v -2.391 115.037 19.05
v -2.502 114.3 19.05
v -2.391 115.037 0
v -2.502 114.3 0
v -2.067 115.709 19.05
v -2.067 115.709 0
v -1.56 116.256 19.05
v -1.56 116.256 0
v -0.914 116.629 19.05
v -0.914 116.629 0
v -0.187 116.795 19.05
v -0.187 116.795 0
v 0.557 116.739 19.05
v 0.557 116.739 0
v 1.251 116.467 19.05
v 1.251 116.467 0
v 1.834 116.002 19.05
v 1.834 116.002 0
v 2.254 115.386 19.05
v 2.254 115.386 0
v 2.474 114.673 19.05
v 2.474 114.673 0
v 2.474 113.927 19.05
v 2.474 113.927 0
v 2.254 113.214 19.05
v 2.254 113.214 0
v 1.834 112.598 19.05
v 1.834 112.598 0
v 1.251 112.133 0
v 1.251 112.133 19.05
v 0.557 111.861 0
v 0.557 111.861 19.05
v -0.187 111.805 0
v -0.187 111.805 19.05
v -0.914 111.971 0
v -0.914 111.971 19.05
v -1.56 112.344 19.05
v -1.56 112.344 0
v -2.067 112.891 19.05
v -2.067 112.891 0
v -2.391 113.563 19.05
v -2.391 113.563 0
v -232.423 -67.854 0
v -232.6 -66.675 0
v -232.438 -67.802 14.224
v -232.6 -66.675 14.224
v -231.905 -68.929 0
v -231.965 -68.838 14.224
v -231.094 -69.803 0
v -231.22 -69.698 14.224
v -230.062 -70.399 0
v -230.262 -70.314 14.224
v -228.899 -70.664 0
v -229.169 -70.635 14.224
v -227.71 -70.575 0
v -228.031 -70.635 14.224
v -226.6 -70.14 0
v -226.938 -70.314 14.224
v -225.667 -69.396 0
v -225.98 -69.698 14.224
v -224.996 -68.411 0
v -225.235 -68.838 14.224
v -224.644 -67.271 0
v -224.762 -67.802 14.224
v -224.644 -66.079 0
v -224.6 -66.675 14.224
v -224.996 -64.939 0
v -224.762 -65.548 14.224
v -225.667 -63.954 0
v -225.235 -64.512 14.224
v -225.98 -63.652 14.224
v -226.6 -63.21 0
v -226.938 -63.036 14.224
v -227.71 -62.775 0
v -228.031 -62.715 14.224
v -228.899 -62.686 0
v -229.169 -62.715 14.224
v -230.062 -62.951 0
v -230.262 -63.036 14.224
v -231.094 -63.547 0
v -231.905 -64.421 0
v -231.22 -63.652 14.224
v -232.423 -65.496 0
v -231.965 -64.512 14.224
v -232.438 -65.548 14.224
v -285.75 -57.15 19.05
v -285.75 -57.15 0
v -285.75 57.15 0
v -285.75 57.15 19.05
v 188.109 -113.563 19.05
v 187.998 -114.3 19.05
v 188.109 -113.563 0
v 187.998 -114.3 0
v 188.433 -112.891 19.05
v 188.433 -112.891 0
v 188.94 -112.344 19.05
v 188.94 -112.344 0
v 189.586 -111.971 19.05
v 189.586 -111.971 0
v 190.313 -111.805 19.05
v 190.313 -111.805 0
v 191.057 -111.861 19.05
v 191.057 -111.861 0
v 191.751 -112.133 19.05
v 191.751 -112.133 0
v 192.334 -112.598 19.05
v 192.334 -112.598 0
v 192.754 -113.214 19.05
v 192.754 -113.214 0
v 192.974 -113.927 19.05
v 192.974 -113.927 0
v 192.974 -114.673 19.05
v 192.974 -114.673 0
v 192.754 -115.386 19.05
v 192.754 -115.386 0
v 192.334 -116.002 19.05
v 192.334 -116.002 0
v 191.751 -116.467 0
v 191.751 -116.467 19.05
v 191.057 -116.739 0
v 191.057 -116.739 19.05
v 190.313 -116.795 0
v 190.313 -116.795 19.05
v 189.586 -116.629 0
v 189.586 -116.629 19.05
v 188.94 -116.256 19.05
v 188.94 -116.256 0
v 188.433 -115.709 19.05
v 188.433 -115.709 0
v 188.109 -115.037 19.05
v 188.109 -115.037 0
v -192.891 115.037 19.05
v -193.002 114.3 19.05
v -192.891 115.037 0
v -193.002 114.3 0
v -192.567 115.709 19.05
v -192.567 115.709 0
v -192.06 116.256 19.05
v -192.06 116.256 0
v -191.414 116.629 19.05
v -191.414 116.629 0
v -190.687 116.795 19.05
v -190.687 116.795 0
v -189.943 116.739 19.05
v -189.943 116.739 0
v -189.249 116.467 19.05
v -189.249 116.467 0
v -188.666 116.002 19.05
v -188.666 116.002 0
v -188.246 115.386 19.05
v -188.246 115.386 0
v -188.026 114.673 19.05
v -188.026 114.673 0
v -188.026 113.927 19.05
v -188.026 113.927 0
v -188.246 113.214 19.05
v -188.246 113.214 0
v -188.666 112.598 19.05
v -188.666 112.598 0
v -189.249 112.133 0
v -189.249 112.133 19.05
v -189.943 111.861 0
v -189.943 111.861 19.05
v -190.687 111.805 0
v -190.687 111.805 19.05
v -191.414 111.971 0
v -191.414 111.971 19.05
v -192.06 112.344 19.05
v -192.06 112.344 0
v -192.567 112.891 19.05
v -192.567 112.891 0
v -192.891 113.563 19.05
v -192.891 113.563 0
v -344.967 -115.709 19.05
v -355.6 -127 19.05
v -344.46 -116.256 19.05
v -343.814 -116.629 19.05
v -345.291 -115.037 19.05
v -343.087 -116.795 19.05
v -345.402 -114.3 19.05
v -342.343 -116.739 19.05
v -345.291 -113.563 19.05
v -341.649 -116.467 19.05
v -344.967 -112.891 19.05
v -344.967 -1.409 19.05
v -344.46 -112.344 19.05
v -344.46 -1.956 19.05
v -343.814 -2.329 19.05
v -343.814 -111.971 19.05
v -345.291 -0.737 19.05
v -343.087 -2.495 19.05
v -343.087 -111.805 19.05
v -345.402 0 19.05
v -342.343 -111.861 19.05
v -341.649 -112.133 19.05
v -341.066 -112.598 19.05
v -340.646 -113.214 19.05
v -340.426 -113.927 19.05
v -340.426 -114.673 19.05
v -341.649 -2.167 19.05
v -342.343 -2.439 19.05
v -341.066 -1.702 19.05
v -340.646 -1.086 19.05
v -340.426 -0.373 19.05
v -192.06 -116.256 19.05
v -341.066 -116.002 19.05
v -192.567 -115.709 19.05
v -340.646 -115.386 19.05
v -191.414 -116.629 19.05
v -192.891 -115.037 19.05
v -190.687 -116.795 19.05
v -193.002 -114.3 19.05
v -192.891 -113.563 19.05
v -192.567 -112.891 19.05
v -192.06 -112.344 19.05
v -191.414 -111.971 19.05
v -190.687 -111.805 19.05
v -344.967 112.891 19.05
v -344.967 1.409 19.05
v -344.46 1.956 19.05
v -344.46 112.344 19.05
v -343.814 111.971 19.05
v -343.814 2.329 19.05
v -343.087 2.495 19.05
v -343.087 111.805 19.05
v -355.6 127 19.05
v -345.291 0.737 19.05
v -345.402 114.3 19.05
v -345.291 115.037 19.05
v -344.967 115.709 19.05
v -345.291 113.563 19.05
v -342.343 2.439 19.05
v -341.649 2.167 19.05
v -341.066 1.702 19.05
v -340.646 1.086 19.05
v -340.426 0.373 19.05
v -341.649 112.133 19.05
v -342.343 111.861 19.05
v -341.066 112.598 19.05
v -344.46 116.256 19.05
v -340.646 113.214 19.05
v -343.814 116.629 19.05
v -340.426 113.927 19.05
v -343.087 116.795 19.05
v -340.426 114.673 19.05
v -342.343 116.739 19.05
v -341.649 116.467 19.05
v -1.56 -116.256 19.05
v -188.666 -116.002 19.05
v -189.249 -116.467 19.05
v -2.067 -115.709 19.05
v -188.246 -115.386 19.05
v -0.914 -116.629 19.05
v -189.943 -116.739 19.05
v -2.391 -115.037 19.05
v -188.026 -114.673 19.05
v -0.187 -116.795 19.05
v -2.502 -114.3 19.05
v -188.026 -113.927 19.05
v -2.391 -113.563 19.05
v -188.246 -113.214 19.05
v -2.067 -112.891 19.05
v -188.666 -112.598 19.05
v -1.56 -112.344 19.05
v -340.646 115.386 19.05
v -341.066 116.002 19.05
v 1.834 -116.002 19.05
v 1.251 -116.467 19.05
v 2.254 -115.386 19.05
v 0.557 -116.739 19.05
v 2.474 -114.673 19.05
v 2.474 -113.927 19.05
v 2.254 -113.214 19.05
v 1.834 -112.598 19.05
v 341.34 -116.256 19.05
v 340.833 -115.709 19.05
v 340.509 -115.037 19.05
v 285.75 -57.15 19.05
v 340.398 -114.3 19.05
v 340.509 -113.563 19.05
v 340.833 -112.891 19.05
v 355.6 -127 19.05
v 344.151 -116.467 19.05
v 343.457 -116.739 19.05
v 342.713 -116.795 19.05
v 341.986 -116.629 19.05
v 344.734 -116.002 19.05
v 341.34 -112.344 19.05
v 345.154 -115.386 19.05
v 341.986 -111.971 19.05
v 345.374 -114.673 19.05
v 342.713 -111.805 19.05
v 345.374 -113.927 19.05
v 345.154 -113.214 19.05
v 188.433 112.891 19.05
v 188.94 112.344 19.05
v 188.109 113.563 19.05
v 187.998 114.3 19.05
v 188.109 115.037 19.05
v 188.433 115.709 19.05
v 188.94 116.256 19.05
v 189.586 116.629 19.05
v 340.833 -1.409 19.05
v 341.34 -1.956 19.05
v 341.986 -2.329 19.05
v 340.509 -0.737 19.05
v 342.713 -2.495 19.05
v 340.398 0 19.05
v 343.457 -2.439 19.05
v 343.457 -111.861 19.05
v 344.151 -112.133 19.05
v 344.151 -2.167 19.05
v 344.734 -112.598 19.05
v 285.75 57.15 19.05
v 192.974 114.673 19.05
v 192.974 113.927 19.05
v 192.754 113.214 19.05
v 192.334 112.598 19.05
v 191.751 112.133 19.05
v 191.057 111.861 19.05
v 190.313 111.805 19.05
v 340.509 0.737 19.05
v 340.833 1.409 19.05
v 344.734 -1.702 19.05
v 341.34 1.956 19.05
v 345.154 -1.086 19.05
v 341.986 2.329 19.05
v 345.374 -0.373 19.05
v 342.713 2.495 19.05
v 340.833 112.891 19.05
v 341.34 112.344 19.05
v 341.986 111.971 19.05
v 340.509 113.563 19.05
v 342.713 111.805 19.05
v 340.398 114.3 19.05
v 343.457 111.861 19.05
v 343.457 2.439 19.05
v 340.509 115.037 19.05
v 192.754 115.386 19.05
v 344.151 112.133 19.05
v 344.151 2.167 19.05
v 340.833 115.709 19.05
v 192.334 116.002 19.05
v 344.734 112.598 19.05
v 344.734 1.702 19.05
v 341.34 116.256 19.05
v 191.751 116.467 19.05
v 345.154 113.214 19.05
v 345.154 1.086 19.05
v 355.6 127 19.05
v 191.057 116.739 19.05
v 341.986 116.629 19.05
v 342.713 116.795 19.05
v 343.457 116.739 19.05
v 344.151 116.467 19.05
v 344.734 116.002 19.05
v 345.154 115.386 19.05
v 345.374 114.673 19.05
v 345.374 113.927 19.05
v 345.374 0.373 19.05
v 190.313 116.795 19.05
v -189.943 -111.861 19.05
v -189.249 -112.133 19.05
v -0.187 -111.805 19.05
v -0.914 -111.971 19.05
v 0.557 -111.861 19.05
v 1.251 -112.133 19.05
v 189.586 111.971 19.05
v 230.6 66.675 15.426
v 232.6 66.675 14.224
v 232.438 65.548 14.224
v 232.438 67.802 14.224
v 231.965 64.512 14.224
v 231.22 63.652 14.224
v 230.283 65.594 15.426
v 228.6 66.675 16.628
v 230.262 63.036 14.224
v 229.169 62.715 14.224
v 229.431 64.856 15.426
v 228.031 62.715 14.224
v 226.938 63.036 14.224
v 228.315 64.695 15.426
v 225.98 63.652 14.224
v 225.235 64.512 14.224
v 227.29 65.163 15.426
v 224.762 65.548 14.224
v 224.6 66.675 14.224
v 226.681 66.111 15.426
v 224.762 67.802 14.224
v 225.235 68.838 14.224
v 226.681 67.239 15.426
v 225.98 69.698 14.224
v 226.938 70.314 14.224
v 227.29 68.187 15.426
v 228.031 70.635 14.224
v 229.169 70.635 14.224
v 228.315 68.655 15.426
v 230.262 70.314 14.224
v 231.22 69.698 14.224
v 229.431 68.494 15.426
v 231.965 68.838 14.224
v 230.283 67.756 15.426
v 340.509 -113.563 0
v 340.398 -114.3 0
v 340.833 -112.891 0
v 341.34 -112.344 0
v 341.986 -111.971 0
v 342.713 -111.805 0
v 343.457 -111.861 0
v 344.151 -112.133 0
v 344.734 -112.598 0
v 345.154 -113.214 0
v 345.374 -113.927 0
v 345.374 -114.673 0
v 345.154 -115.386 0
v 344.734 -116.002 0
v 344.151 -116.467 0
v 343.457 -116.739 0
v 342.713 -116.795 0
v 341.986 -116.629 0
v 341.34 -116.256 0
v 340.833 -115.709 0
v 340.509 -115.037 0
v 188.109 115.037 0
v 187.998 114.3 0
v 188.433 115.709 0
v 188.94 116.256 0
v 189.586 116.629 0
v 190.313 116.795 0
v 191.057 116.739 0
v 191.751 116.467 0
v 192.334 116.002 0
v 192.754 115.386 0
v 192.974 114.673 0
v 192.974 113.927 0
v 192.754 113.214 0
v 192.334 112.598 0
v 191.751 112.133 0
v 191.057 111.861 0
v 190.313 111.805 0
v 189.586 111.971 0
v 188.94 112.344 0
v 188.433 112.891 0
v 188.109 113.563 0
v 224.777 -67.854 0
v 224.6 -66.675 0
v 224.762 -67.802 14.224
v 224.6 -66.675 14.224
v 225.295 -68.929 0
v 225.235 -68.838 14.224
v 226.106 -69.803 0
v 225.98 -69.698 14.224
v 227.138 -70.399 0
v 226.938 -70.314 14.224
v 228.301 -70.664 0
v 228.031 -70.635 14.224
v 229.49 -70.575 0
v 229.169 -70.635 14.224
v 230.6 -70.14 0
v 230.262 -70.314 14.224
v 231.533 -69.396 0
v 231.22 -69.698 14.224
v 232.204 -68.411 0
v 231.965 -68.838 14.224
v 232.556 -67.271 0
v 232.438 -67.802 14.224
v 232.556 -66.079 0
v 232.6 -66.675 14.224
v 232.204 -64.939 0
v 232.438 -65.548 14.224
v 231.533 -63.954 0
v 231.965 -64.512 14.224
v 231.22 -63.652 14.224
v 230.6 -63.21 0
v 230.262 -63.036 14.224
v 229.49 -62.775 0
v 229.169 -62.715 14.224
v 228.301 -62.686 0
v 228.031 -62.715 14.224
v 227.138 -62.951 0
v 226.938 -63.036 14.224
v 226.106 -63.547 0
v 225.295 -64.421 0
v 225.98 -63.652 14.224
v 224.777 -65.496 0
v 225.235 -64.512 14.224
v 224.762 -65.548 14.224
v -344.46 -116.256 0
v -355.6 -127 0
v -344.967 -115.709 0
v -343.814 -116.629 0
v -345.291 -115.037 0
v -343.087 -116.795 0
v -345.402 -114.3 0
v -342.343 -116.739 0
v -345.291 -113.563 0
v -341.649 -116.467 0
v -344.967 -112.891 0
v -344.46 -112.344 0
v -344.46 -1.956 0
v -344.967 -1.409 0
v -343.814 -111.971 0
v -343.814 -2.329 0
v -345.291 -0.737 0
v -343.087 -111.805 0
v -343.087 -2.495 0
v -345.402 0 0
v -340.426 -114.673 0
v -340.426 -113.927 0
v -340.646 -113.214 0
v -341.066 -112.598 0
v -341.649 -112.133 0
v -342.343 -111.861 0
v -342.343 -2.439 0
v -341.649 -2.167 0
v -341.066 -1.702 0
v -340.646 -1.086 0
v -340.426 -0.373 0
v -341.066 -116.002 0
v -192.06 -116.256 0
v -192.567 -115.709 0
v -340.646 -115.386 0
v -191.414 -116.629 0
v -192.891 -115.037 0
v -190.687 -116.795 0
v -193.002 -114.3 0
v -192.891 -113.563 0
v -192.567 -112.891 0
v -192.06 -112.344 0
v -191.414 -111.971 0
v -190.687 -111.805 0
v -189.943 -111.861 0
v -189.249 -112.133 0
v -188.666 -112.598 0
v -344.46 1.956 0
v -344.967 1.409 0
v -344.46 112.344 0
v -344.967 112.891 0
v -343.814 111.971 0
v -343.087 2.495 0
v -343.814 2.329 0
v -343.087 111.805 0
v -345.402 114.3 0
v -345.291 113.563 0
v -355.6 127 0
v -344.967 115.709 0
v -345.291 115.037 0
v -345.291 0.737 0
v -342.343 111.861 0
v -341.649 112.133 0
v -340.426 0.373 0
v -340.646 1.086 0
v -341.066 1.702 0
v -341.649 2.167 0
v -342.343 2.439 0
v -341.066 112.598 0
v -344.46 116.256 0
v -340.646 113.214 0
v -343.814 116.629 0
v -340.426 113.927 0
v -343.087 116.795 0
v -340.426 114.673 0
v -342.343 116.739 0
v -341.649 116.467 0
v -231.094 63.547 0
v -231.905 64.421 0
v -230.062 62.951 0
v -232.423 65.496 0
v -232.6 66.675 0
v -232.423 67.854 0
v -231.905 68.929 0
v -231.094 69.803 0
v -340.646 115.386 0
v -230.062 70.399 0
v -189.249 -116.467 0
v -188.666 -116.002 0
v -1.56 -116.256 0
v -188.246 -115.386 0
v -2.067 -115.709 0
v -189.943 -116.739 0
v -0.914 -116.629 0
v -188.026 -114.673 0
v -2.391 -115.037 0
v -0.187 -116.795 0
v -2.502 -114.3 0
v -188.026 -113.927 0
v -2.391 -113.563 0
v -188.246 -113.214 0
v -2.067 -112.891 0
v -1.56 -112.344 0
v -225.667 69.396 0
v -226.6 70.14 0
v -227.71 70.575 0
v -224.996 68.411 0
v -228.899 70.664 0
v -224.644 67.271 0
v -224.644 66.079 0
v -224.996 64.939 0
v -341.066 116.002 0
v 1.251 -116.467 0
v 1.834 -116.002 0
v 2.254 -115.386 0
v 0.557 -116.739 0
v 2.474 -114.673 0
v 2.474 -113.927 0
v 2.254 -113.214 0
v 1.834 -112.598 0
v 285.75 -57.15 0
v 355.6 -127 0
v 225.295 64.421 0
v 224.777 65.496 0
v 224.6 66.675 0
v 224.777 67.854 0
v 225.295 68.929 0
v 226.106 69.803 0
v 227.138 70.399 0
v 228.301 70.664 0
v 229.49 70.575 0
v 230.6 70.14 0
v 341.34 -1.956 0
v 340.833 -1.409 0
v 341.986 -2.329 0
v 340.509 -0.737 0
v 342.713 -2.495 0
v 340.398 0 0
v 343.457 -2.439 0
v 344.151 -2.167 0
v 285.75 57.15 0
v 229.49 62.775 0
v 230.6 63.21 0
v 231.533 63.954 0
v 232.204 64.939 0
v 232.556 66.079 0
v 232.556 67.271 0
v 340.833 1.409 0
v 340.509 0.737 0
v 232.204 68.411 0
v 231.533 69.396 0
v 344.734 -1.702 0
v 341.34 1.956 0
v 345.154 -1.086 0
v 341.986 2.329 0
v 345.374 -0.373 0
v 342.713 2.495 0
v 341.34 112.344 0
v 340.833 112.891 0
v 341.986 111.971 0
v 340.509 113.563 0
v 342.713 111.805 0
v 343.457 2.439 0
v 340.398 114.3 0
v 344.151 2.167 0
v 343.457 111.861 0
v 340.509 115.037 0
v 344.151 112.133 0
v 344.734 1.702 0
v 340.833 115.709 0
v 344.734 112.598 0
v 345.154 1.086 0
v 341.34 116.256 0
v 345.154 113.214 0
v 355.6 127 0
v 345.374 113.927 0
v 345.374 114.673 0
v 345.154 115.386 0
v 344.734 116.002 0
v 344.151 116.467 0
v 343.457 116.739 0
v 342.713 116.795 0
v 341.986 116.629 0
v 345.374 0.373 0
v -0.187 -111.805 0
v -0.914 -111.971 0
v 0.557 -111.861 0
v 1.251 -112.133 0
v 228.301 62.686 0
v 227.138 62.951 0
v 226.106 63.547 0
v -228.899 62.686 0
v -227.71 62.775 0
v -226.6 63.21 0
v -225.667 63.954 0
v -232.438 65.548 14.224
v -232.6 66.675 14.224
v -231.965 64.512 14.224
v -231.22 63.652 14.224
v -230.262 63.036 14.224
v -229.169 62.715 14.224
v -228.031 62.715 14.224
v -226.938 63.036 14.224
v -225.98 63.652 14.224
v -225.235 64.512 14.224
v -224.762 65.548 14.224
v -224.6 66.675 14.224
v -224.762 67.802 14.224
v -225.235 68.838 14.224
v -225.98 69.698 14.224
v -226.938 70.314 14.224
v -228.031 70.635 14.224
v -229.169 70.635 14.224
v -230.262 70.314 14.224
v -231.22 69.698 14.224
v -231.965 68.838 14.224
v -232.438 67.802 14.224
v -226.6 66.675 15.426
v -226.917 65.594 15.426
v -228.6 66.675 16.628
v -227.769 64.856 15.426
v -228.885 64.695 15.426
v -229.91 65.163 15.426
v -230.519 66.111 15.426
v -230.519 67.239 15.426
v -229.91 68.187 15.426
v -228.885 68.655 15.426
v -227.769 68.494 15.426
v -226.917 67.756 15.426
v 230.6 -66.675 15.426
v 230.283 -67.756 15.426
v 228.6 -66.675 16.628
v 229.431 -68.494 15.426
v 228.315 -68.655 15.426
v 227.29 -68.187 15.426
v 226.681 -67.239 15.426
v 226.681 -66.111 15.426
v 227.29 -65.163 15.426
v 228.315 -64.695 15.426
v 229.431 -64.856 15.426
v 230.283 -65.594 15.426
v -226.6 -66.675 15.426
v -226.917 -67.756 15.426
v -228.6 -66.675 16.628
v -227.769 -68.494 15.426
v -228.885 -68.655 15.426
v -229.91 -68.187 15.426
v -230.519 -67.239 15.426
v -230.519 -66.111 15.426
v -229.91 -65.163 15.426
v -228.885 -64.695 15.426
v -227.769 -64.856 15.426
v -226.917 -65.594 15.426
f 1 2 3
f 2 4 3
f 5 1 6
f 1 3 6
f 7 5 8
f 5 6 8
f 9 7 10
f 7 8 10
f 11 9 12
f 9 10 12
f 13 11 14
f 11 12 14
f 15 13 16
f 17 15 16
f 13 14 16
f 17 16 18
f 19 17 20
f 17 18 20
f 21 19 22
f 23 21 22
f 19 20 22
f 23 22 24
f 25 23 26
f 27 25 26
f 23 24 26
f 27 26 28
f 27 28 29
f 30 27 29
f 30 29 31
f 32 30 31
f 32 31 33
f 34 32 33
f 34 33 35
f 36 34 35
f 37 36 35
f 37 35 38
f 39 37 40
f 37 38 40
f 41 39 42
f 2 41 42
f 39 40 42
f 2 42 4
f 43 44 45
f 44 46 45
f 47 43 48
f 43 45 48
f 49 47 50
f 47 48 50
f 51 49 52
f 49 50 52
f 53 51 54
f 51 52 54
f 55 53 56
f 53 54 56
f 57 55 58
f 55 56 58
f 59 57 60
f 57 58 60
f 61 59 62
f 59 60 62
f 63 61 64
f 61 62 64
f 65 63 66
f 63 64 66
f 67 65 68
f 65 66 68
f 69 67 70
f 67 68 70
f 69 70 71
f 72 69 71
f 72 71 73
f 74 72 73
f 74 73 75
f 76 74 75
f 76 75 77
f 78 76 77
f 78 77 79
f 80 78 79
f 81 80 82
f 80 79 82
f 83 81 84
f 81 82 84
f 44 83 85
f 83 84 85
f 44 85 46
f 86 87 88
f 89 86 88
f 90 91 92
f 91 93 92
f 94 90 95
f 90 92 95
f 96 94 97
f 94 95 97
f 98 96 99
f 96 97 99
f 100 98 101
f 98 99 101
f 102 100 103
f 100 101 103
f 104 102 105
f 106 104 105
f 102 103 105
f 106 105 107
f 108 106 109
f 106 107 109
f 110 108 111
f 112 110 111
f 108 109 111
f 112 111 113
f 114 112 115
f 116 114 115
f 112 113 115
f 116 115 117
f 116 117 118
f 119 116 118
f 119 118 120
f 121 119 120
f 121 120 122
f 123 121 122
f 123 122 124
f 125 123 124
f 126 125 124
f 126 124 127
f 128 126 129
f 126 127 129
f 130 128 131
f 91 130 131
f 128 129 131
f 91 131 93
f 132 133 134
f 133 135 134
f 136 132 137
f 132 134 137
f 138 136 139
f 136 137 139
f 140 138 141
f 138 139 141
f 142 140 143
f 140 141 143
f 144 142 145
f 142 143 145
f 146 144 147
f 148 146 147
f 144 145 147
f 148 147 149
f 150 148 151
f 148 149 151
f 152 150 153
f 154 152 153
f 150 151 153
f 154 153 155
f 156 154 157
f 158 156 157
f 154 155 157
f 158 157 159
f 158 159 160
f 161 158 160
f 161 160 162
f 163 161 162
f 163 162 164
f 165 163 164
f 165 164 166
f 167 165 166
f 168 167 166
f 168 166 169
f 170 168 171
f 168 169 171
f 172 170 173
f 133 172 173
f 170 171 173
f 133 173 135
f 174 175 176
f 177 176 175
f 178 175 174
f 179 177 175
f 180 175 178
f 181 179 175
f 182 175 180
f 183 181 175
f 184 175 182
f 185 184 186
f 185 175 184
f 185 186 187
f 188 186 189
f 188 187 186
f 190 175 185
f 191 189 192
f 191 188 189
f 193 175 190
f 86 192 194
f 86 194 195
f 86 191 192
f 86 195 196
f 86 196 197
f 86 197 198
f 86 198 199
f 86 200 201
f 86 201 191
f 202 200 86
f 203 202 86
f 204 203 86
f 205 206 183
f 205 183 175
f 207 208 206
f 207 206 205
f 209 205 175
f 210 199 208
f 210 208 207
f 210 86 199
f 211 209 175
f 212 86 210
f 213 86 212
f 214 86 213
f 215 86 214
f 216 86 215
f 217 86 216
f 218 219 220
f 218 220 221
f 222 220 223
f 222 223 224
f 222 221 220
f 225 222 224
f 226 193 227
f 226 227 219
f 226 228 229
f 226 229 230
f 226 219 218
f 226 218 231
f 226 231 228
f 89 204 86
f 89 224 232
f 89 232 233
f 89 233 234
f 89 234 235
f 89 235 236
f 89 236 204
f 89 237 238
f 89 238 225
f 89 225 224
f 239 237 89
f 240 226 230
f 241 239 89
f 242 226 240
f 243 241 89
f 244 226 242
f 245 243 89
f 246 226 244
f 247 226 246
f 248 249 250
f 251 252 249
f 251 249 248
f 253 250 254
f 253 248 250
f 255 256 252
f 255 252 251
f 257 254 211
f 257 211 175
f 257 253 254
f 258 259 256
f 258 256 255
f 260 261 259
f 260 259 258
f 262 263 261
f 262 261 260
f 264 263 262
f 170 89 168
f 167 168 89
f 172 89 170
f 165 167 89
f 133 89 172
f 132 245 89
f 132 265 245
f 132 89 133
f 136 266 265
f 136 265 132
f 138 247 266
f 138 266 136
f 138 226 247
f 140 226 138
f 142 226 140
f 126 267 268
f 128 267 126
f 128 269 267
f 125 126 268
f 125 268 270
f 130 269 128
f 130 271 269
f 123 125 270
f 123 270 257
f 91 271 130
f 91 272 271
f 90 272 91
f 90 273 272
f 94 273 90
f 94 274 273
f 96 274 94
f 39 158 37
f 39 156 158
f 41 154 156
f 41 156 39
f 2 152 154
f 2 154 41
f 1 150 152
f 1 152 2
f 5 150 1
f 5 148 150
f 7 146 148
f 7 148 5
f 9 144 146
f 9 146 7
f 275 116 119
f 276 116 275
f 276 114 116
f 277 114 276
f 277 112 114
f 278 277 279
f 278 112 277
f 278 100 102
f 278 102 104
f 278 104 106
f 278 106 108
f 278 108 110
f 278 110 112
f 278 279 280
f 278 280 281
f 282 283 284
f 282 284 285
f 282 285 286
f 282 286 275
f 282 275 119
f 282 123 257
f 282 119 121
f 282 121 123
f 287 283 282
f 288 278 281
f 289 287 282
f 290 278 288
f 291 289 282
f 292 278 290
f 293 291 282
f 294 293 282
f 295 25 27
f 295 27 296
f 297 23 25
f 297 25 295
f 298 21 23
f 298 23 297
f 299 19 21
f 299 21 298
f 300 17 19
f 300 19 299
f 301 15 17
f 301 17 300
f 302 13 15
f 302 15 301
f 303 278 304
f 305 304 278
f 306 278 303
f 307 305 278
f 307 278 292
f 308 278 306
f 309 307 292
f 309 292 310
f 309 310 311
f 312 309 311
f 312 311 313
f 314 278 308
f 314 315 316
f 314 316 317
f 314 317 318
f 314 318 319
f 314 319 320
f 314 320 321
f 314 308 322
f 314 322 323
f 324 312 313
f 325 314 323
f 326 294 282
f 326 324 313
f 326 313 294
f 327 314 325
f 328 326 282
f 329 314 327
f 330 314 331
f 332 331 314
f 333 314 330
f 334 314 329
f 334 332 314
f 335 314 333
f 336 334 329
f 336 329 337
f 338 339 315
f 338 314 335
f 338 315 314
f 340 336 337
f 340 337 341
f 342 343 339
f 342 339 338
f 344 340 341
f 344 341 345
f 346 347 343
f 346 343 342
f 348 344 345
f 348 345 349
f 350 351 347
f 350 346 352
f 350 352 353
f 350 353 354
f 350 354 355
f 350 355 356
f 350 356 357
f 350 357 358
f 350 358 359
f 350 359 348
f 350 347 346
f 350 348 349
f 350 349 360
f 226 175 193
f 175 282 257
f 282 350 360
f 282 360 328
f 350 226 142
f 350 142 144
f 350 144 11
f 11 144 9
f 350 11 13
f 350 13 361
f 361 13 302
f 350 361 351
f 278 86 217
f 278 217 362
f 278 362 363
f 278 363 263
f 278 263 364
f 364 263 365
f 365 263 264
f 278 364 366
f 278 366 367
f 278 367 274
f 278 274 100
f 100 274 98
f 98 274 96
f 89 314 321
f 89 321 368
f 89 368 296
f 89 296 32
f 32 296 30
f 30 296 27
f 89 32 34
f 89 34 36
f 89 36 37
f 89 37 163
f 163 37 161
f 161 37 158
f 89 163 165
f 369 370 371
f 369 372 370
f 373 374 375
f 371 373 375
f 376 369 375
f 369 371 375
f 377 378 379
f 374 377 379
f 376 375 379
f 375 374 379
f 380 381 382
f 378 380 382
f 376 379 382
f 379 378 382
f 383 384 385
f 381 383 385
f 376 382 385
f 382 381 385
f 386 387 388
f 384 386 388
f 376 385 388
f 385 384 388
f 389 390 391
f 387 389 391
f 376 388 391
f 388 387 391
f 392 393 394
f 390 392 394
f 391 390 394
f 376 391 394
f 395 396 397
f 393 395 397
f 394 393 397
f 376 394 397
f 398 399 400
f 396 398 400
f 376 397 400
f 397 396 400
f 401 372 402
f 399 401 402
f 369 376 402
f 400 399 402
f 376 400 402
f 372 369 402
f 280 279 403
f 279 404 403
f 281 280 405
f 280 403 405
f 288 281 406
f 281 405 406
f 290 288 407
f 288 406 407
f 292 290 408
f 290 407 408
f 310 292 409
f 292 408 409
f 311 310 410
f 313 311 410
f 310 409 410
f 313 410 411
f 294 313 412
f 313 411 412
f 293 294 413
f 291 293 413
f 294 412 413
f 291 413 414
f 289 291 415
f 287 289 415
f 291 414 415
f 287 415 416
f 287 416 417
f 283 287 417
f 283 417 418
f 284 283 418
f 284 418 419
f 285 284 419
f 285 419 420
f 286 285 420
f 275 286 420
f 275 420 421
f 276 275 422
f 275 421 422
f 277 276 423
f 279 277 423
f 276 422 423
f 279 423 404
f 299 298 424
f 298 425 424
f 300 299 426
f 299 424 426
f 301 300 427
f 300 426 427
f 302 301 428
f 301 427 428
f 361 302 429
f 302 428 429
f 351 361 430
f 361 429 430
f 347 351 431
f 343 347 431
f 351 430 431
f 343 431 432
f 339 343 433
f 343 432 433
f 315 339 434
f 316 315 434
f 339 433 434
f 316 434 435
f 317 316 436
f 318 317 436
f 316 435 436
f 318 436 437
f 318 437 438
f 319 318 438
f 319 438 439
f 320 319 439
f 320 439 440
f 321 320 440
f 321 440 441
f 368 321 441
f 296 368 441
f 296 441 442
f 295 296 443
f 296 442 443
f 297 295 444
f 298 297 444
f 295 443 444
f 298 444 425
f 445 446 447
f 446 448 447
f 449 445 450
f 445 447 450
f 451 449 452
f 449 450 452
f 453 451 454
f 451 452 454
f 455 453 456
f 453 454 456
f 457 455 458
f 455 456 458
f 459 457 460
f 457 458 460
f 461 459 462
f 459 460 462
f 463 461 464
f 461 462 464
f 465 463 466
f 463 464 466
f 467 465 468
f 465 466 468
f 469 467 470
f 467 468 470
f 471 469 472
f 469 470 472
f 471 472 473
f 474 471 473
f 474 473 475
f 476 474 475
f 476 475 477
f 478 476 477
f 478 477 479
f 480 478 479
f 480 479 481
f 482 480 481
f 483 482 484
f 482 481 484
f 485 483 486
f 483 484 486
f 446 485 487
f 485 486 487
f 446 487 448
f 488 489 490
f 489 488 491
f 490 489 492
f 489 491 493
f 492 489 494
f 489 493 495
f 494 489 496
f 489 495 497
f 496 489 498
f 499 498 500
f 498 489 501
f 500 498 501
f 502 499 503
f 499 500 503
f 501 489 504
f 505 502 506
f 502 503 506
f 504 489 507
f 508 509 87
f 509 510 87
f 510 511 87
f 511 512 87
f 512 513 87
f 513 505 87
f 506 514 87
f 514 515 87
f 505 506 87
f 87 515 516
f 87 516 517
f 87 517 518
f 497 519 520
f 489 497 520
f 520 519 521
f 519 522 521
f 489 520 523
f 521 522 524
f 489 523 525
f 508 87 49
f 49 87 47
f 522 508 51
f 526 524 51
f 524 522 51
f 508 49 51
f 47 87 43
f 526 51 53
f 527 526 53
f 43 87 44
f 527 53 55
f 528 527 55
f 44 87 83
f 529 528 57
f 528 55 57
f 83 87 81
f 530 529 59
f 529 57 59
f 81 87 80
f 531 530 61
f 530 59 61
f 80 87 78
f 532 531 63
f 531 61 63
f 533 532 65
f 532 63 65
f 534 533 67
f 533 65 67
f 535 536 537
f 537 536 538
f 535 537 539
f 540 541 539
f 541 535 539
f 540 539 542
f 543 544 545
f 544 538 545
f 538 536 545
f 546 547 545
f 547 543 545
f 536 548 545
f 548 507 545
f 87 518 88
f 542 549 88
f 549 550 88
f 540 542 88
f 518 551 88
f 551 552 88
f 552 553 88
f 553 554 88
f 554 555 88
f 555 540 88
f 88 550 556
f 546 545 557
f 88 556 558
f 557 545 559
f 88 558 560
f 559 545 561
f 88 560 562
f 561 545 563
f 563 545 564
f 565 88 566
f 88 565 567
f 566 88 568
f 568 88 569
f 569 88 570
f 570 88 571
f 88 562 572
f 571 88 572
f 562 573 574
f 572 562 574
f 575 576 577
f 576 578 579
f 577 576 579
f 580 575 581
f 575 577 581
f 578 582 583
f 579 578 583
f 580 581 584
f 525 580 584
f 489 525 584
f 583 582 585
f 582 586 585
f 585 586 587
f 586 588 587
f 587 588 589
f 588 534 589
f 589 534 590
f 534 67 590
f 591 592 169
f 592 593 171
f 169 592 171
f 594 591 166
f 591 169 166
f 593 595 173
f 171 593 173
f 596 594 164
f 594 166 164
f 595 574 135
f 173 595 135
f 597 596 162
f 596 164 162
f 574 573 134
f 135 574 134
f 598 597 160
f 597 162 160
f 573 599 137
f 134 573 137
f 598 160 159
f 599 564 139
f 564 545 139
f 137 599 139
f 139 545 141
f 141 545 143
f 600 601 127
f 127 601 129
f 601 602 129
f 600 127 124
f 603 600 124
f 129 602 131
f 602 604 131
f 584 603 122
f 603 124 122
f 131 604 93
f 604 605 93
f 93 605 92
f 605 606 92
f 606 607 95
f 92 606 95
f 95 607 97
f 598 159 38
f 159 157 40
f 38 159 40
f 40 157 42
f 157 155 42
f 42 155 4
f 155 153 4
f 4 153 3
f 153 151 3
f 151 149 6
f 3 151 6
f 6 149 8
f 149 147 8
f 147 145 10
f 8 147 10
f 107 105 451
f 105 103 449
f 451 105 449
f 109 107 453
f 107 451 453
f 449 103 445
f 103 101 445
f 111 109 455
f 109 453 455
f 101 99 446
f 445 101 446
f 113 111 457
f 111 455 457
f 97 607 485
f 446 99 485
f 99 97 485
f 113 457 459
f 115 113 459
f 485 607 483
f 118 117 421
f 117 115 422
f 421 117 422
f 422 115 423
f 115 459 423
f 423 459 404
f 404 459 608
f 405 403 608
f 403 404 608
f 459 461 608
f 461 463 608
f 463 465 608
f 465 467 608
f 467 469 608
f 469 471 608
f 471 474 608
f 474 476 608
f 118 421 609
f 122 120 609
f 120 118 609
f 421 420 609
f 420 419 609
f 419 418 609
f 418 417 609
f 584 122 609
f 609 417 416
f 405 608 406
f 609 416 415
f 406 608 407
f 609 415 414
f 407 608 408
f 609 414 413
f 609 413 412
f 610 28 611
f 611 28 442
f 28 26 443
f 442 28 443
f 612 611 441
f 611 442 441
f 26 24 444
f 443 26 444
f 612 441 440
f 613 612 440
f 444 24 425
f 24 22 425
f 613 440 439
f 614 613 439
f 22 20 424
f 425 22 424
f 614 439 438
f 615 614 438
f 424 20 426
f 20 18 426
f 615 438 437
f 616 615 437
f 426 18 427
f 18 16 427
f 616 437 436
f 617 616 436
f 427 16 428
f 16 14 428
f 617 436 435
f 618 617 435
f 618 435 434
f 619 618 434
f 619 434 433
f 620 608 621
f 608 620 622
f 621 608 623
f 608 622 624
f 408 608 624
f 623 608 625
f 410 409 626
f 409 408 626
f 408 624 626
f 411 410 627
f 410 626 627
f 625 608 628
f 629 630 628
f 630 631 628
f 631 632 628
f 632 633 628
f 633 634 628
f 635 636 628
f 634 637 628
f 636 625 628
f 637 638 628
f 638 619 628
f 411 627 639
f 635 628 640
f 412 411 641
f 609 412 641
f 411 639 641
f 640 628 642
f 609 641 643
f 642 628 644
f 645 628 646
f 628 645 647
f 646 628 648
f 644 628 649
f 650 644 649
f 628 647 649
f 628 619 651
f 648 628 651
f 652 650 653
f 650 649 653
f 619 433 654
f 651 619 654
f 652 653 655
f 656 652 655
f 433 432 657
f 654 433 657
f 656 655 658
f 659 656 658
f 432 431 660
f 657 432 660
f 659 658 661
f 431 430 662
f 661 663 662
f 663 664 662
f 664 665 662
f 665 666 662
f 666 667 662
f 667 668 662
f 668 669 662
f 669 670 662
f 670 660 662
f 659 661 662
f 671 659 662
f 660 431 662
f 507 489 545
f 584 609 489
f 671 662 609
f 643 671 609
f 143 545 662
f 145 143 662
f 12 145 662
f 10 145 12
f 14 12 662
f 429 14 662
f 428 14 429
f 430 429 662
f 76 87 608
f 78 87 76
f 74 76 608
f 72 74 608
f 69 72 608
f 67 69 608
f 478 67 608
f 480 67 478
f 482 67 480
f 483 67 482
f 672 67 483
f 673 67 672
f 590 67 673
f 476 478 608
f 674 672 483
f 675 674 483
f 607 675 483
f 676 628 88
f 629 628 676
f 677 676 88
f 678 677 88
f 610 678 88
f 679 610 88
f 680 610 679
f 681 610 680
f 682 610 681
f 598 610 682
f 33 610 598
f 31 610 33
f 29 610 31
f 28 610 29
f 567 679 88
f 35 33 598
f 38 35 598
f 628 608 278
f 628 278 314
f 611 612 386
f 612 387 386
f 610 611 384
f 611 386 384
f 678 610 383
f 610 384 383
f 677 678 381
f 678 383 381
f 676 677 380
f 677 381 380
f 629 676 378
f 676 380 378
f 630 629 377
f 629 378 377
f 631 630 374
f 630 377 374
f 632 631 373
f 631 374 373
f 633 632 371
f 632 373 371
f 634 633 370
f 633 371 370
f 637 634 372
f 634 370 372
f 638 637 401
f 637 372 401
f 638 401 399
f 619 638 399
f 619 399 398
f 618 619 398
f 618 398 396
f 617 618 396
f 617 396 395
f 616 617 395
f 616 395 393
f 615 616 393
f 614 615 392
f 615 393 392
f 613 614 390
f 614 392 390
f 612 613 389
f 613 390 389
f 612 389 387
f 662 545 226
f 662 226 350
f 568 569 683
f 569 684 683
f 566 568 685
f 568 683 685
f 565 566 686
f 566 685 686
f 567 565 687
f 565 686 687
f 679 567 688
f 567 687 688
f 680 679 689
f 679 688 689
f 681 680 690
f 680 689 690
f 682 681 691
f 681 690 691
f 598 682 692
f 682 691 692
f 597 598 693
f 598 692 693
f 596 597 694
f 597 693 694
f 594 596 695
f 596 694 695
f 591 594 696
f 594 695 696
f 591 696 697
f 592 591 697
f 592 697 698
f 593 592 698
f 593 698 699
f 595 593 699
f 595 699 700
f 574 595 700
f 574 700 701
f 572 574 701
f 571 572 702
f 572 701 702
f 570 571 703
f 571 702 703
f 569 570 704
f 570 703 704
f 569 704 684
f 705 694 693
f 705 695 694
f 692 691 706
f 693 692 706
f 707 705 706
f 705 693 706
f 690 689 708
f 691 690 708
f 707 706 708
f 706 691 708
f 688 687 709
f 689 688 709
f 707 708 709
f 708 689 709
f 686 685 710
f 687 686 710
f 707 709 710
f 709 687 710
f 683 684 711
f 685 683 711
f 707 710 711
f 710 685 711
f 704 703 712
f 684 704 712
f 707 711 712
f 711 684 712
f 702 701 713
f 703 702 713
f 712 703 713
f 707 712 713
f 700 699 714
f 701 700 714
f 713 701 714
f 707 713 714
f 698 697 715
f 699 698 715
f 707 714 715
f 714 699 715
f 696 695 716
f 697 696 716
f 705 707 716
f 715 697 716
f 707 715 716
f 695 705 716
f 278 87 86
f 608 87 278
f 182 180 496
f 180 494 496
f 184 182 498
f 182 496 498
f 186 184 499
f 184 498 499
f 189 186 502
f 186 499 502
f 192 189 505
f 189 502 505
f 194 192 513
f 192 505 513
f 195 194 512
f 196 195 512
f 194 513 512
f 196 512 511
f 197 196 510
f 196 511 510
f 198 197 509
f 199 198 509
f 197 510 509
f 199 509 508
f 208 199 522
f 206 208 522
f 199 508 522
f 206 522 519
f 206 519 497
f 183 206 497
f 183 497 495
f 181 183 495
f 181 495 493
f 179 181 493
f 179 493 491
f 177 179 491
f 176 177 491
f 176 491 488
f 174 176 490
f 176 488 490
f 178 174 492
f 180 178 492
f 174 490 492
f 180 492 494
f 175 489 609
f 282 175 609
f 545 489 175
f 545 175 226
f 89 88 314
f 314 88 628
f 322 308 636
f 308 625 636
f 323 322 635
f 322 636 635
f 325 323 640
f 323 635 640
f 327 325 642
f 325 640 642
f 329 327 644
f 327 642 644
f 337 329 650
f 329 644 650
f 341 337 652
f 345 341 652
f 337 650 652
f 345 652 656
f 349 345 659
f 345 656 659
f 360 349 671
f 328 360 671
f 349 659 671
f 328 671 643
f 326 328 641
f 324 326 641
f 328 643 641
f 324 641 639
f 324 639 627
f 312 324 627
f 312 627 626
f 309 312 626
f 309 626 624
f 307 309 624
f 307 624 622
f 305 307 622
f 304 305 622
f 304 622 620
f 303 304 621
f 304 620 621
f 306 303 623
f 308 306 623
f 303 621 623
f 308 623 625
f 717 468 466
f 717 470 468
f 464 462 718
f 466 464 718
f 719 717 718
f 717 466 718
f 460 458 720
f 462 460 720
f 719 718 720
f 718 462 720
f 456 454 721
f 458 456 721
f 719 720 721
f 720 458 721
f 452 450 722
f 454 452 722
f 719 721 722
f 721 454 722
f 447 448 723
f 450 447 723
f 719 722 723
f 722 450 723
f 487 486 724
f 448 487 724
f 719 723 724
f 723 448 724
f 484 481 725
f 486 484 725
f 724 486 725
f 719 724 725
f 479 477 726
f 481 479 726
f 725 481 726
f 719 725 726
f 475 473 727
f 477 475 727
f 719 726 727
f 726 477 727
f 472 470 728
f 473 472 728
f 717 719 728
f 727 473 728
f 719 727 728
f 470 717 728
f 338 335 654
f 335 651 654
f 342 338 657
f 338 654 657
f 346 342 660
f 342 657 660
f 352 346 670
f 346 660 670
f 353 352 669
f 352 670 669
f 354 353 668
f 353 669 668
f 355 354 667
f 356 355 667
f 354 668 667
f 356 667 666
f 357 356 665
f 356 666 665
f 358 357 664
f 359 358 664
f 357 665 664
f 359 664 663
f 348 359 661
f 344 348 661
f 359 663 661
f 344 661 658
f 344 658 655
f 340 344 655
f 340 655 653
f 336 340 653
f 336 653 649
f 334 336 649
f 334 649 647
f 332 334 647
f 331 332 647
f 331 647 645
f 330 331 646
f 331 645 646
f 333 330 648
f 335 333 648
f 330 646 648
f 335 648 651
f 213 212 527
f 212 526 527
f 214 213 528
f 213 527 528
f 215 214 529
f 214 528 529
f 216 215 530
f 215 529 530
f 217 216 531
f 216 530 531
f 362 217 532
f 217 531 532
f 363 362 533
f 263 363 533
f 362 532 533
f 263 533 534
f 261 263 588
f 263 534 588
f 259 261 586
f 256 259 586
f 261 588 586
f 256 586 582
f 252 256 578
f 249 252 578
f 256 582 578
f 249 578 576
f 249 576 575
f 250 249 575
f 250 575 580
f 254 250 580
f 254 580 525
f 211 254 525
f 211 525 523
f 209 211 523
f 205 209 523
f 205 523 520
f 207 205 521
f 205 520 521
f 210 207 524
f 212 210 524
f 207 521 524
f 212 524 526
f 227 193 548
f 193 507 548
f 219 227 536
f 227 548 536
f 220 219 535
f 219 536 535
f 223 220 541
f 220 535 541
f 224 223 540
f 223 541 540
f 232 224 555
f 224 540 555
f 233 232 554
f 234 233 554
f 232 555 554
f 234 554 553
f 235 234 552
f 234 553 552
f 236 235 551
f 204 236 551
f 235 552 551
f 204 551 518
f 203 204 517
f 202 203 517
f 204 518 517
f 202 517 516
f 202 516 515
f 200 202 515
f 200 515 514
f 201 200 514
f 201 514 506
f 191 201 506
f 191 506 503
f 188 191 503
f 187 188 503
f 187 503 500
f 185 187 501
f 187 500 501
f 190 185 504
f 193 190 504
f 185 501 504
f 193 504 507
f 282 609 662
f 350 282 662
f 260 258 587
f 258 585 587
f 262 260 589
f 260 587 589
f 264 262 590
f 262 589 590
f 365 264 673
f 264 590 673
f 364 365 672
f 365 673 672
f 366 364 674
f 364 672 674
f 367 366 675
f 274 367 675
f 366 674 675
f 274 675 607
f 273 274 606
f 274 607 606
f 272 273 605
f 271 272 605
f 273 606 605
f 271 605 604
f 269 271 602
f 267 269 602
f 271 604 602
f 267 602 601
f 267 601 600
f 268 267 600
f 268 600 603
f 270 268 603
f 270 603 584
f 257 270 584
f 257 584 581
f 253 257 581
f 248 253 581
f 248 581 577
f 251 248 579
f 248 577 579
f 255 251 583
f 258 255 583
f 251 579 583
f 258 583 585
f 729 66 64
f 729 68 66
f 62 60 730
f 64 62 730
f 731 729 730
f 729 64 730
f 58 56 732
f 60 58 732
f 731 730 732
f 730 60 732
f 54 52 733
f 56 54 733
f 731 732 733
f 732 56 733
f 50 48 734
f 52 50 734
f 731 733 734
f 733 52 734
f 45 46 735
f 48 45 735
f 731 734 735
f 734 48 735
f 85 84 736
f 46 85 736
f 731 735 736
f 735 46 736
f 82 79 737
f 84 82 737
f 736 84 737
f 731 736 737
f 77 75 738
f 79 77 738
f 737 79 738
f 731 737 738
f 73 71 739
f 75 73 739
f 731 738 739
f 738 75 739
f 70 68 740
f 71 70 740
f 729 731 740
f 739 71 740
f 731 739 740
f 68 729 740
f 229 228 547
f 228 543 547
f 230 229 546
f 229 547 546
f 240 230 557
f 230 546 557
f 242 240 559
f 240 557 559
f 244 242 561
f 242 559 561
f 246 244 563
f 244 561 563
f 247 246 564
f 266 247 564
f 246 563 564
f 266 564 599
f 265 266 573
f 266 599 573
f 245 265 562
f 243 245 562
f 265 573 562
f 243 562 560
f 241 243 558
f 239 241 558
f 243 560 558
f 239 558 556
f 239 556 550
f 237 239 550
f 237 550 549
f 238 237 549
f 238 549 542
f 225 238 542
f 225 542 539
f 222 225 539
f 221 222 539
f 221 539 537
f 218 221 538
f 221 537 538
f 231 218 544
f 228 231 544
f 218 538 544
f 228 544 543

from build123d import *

# Parameters (mm, degrees)
F0_W     = 711.2
F0_H     = 254
F0_W_2   = 571.5
F0_H_2   = 114.3
F1_DEPTH = 19.05
F3_D     = 5.0038
F3_DEPTH = 19.05
F3_TIP   = 1.5032931827
F5_D     = 8.001
F5_DEPTH = 14.224
F5_TIP   = 2.4037429064


with BuildPart() as f1:
    # F0 (on Top) → F1 (new body)
    with BuildSketch(Plane.XY):
        Rectangle(F0_W, F0_H)
        Rectangle(F0_W_2, F0_H_2, mode=Mode.SUBTRACT)
    extrude(amount=F1_DEPTH)

    # F3
    with Locations(Plane.XY.offset(19.05)):
        with Locations((-342.9, 114.3), (-342.9, 0), (-190.5, 114.3), (190.5, 114.3), (342.9, 114.3), (342.9, 0), (342.9, -114.3), (190.5, -114.3), (-190.5, -114.3), (-342.9, -114.3), (0, 114.3), (0, -114.3)):
            Hole(F3_D / 2, depth=F3_DEPTH)
            with Locations((0, 0, -(F3_DEPTH + F3_TIP / 2))):  # 118° drill point
                Cone(0, F3_D / 2, F3_TIP, mode=Mode.SUBTRACT)

    # F5
    with Locations(Plane(origin=(0, 0, 0), x_dir=(1, 0, 0), z_dir=(0, 0, -1))):
        with Locations((-228.6, 66.675), (-228.6, -66.675), (228.6, 66.675), (228.6, -66.675)):
            Hole(F5_D / 2, depth=F5_DEPTH)
            with Locations((0, 0, -(F5_DEPTH + F5_TIP / 2))):  # 118° drill point
                Cone(0, F5_D / 2, F5_TIP, mode=Mode.SUBTRACT)


solid = f1.part
